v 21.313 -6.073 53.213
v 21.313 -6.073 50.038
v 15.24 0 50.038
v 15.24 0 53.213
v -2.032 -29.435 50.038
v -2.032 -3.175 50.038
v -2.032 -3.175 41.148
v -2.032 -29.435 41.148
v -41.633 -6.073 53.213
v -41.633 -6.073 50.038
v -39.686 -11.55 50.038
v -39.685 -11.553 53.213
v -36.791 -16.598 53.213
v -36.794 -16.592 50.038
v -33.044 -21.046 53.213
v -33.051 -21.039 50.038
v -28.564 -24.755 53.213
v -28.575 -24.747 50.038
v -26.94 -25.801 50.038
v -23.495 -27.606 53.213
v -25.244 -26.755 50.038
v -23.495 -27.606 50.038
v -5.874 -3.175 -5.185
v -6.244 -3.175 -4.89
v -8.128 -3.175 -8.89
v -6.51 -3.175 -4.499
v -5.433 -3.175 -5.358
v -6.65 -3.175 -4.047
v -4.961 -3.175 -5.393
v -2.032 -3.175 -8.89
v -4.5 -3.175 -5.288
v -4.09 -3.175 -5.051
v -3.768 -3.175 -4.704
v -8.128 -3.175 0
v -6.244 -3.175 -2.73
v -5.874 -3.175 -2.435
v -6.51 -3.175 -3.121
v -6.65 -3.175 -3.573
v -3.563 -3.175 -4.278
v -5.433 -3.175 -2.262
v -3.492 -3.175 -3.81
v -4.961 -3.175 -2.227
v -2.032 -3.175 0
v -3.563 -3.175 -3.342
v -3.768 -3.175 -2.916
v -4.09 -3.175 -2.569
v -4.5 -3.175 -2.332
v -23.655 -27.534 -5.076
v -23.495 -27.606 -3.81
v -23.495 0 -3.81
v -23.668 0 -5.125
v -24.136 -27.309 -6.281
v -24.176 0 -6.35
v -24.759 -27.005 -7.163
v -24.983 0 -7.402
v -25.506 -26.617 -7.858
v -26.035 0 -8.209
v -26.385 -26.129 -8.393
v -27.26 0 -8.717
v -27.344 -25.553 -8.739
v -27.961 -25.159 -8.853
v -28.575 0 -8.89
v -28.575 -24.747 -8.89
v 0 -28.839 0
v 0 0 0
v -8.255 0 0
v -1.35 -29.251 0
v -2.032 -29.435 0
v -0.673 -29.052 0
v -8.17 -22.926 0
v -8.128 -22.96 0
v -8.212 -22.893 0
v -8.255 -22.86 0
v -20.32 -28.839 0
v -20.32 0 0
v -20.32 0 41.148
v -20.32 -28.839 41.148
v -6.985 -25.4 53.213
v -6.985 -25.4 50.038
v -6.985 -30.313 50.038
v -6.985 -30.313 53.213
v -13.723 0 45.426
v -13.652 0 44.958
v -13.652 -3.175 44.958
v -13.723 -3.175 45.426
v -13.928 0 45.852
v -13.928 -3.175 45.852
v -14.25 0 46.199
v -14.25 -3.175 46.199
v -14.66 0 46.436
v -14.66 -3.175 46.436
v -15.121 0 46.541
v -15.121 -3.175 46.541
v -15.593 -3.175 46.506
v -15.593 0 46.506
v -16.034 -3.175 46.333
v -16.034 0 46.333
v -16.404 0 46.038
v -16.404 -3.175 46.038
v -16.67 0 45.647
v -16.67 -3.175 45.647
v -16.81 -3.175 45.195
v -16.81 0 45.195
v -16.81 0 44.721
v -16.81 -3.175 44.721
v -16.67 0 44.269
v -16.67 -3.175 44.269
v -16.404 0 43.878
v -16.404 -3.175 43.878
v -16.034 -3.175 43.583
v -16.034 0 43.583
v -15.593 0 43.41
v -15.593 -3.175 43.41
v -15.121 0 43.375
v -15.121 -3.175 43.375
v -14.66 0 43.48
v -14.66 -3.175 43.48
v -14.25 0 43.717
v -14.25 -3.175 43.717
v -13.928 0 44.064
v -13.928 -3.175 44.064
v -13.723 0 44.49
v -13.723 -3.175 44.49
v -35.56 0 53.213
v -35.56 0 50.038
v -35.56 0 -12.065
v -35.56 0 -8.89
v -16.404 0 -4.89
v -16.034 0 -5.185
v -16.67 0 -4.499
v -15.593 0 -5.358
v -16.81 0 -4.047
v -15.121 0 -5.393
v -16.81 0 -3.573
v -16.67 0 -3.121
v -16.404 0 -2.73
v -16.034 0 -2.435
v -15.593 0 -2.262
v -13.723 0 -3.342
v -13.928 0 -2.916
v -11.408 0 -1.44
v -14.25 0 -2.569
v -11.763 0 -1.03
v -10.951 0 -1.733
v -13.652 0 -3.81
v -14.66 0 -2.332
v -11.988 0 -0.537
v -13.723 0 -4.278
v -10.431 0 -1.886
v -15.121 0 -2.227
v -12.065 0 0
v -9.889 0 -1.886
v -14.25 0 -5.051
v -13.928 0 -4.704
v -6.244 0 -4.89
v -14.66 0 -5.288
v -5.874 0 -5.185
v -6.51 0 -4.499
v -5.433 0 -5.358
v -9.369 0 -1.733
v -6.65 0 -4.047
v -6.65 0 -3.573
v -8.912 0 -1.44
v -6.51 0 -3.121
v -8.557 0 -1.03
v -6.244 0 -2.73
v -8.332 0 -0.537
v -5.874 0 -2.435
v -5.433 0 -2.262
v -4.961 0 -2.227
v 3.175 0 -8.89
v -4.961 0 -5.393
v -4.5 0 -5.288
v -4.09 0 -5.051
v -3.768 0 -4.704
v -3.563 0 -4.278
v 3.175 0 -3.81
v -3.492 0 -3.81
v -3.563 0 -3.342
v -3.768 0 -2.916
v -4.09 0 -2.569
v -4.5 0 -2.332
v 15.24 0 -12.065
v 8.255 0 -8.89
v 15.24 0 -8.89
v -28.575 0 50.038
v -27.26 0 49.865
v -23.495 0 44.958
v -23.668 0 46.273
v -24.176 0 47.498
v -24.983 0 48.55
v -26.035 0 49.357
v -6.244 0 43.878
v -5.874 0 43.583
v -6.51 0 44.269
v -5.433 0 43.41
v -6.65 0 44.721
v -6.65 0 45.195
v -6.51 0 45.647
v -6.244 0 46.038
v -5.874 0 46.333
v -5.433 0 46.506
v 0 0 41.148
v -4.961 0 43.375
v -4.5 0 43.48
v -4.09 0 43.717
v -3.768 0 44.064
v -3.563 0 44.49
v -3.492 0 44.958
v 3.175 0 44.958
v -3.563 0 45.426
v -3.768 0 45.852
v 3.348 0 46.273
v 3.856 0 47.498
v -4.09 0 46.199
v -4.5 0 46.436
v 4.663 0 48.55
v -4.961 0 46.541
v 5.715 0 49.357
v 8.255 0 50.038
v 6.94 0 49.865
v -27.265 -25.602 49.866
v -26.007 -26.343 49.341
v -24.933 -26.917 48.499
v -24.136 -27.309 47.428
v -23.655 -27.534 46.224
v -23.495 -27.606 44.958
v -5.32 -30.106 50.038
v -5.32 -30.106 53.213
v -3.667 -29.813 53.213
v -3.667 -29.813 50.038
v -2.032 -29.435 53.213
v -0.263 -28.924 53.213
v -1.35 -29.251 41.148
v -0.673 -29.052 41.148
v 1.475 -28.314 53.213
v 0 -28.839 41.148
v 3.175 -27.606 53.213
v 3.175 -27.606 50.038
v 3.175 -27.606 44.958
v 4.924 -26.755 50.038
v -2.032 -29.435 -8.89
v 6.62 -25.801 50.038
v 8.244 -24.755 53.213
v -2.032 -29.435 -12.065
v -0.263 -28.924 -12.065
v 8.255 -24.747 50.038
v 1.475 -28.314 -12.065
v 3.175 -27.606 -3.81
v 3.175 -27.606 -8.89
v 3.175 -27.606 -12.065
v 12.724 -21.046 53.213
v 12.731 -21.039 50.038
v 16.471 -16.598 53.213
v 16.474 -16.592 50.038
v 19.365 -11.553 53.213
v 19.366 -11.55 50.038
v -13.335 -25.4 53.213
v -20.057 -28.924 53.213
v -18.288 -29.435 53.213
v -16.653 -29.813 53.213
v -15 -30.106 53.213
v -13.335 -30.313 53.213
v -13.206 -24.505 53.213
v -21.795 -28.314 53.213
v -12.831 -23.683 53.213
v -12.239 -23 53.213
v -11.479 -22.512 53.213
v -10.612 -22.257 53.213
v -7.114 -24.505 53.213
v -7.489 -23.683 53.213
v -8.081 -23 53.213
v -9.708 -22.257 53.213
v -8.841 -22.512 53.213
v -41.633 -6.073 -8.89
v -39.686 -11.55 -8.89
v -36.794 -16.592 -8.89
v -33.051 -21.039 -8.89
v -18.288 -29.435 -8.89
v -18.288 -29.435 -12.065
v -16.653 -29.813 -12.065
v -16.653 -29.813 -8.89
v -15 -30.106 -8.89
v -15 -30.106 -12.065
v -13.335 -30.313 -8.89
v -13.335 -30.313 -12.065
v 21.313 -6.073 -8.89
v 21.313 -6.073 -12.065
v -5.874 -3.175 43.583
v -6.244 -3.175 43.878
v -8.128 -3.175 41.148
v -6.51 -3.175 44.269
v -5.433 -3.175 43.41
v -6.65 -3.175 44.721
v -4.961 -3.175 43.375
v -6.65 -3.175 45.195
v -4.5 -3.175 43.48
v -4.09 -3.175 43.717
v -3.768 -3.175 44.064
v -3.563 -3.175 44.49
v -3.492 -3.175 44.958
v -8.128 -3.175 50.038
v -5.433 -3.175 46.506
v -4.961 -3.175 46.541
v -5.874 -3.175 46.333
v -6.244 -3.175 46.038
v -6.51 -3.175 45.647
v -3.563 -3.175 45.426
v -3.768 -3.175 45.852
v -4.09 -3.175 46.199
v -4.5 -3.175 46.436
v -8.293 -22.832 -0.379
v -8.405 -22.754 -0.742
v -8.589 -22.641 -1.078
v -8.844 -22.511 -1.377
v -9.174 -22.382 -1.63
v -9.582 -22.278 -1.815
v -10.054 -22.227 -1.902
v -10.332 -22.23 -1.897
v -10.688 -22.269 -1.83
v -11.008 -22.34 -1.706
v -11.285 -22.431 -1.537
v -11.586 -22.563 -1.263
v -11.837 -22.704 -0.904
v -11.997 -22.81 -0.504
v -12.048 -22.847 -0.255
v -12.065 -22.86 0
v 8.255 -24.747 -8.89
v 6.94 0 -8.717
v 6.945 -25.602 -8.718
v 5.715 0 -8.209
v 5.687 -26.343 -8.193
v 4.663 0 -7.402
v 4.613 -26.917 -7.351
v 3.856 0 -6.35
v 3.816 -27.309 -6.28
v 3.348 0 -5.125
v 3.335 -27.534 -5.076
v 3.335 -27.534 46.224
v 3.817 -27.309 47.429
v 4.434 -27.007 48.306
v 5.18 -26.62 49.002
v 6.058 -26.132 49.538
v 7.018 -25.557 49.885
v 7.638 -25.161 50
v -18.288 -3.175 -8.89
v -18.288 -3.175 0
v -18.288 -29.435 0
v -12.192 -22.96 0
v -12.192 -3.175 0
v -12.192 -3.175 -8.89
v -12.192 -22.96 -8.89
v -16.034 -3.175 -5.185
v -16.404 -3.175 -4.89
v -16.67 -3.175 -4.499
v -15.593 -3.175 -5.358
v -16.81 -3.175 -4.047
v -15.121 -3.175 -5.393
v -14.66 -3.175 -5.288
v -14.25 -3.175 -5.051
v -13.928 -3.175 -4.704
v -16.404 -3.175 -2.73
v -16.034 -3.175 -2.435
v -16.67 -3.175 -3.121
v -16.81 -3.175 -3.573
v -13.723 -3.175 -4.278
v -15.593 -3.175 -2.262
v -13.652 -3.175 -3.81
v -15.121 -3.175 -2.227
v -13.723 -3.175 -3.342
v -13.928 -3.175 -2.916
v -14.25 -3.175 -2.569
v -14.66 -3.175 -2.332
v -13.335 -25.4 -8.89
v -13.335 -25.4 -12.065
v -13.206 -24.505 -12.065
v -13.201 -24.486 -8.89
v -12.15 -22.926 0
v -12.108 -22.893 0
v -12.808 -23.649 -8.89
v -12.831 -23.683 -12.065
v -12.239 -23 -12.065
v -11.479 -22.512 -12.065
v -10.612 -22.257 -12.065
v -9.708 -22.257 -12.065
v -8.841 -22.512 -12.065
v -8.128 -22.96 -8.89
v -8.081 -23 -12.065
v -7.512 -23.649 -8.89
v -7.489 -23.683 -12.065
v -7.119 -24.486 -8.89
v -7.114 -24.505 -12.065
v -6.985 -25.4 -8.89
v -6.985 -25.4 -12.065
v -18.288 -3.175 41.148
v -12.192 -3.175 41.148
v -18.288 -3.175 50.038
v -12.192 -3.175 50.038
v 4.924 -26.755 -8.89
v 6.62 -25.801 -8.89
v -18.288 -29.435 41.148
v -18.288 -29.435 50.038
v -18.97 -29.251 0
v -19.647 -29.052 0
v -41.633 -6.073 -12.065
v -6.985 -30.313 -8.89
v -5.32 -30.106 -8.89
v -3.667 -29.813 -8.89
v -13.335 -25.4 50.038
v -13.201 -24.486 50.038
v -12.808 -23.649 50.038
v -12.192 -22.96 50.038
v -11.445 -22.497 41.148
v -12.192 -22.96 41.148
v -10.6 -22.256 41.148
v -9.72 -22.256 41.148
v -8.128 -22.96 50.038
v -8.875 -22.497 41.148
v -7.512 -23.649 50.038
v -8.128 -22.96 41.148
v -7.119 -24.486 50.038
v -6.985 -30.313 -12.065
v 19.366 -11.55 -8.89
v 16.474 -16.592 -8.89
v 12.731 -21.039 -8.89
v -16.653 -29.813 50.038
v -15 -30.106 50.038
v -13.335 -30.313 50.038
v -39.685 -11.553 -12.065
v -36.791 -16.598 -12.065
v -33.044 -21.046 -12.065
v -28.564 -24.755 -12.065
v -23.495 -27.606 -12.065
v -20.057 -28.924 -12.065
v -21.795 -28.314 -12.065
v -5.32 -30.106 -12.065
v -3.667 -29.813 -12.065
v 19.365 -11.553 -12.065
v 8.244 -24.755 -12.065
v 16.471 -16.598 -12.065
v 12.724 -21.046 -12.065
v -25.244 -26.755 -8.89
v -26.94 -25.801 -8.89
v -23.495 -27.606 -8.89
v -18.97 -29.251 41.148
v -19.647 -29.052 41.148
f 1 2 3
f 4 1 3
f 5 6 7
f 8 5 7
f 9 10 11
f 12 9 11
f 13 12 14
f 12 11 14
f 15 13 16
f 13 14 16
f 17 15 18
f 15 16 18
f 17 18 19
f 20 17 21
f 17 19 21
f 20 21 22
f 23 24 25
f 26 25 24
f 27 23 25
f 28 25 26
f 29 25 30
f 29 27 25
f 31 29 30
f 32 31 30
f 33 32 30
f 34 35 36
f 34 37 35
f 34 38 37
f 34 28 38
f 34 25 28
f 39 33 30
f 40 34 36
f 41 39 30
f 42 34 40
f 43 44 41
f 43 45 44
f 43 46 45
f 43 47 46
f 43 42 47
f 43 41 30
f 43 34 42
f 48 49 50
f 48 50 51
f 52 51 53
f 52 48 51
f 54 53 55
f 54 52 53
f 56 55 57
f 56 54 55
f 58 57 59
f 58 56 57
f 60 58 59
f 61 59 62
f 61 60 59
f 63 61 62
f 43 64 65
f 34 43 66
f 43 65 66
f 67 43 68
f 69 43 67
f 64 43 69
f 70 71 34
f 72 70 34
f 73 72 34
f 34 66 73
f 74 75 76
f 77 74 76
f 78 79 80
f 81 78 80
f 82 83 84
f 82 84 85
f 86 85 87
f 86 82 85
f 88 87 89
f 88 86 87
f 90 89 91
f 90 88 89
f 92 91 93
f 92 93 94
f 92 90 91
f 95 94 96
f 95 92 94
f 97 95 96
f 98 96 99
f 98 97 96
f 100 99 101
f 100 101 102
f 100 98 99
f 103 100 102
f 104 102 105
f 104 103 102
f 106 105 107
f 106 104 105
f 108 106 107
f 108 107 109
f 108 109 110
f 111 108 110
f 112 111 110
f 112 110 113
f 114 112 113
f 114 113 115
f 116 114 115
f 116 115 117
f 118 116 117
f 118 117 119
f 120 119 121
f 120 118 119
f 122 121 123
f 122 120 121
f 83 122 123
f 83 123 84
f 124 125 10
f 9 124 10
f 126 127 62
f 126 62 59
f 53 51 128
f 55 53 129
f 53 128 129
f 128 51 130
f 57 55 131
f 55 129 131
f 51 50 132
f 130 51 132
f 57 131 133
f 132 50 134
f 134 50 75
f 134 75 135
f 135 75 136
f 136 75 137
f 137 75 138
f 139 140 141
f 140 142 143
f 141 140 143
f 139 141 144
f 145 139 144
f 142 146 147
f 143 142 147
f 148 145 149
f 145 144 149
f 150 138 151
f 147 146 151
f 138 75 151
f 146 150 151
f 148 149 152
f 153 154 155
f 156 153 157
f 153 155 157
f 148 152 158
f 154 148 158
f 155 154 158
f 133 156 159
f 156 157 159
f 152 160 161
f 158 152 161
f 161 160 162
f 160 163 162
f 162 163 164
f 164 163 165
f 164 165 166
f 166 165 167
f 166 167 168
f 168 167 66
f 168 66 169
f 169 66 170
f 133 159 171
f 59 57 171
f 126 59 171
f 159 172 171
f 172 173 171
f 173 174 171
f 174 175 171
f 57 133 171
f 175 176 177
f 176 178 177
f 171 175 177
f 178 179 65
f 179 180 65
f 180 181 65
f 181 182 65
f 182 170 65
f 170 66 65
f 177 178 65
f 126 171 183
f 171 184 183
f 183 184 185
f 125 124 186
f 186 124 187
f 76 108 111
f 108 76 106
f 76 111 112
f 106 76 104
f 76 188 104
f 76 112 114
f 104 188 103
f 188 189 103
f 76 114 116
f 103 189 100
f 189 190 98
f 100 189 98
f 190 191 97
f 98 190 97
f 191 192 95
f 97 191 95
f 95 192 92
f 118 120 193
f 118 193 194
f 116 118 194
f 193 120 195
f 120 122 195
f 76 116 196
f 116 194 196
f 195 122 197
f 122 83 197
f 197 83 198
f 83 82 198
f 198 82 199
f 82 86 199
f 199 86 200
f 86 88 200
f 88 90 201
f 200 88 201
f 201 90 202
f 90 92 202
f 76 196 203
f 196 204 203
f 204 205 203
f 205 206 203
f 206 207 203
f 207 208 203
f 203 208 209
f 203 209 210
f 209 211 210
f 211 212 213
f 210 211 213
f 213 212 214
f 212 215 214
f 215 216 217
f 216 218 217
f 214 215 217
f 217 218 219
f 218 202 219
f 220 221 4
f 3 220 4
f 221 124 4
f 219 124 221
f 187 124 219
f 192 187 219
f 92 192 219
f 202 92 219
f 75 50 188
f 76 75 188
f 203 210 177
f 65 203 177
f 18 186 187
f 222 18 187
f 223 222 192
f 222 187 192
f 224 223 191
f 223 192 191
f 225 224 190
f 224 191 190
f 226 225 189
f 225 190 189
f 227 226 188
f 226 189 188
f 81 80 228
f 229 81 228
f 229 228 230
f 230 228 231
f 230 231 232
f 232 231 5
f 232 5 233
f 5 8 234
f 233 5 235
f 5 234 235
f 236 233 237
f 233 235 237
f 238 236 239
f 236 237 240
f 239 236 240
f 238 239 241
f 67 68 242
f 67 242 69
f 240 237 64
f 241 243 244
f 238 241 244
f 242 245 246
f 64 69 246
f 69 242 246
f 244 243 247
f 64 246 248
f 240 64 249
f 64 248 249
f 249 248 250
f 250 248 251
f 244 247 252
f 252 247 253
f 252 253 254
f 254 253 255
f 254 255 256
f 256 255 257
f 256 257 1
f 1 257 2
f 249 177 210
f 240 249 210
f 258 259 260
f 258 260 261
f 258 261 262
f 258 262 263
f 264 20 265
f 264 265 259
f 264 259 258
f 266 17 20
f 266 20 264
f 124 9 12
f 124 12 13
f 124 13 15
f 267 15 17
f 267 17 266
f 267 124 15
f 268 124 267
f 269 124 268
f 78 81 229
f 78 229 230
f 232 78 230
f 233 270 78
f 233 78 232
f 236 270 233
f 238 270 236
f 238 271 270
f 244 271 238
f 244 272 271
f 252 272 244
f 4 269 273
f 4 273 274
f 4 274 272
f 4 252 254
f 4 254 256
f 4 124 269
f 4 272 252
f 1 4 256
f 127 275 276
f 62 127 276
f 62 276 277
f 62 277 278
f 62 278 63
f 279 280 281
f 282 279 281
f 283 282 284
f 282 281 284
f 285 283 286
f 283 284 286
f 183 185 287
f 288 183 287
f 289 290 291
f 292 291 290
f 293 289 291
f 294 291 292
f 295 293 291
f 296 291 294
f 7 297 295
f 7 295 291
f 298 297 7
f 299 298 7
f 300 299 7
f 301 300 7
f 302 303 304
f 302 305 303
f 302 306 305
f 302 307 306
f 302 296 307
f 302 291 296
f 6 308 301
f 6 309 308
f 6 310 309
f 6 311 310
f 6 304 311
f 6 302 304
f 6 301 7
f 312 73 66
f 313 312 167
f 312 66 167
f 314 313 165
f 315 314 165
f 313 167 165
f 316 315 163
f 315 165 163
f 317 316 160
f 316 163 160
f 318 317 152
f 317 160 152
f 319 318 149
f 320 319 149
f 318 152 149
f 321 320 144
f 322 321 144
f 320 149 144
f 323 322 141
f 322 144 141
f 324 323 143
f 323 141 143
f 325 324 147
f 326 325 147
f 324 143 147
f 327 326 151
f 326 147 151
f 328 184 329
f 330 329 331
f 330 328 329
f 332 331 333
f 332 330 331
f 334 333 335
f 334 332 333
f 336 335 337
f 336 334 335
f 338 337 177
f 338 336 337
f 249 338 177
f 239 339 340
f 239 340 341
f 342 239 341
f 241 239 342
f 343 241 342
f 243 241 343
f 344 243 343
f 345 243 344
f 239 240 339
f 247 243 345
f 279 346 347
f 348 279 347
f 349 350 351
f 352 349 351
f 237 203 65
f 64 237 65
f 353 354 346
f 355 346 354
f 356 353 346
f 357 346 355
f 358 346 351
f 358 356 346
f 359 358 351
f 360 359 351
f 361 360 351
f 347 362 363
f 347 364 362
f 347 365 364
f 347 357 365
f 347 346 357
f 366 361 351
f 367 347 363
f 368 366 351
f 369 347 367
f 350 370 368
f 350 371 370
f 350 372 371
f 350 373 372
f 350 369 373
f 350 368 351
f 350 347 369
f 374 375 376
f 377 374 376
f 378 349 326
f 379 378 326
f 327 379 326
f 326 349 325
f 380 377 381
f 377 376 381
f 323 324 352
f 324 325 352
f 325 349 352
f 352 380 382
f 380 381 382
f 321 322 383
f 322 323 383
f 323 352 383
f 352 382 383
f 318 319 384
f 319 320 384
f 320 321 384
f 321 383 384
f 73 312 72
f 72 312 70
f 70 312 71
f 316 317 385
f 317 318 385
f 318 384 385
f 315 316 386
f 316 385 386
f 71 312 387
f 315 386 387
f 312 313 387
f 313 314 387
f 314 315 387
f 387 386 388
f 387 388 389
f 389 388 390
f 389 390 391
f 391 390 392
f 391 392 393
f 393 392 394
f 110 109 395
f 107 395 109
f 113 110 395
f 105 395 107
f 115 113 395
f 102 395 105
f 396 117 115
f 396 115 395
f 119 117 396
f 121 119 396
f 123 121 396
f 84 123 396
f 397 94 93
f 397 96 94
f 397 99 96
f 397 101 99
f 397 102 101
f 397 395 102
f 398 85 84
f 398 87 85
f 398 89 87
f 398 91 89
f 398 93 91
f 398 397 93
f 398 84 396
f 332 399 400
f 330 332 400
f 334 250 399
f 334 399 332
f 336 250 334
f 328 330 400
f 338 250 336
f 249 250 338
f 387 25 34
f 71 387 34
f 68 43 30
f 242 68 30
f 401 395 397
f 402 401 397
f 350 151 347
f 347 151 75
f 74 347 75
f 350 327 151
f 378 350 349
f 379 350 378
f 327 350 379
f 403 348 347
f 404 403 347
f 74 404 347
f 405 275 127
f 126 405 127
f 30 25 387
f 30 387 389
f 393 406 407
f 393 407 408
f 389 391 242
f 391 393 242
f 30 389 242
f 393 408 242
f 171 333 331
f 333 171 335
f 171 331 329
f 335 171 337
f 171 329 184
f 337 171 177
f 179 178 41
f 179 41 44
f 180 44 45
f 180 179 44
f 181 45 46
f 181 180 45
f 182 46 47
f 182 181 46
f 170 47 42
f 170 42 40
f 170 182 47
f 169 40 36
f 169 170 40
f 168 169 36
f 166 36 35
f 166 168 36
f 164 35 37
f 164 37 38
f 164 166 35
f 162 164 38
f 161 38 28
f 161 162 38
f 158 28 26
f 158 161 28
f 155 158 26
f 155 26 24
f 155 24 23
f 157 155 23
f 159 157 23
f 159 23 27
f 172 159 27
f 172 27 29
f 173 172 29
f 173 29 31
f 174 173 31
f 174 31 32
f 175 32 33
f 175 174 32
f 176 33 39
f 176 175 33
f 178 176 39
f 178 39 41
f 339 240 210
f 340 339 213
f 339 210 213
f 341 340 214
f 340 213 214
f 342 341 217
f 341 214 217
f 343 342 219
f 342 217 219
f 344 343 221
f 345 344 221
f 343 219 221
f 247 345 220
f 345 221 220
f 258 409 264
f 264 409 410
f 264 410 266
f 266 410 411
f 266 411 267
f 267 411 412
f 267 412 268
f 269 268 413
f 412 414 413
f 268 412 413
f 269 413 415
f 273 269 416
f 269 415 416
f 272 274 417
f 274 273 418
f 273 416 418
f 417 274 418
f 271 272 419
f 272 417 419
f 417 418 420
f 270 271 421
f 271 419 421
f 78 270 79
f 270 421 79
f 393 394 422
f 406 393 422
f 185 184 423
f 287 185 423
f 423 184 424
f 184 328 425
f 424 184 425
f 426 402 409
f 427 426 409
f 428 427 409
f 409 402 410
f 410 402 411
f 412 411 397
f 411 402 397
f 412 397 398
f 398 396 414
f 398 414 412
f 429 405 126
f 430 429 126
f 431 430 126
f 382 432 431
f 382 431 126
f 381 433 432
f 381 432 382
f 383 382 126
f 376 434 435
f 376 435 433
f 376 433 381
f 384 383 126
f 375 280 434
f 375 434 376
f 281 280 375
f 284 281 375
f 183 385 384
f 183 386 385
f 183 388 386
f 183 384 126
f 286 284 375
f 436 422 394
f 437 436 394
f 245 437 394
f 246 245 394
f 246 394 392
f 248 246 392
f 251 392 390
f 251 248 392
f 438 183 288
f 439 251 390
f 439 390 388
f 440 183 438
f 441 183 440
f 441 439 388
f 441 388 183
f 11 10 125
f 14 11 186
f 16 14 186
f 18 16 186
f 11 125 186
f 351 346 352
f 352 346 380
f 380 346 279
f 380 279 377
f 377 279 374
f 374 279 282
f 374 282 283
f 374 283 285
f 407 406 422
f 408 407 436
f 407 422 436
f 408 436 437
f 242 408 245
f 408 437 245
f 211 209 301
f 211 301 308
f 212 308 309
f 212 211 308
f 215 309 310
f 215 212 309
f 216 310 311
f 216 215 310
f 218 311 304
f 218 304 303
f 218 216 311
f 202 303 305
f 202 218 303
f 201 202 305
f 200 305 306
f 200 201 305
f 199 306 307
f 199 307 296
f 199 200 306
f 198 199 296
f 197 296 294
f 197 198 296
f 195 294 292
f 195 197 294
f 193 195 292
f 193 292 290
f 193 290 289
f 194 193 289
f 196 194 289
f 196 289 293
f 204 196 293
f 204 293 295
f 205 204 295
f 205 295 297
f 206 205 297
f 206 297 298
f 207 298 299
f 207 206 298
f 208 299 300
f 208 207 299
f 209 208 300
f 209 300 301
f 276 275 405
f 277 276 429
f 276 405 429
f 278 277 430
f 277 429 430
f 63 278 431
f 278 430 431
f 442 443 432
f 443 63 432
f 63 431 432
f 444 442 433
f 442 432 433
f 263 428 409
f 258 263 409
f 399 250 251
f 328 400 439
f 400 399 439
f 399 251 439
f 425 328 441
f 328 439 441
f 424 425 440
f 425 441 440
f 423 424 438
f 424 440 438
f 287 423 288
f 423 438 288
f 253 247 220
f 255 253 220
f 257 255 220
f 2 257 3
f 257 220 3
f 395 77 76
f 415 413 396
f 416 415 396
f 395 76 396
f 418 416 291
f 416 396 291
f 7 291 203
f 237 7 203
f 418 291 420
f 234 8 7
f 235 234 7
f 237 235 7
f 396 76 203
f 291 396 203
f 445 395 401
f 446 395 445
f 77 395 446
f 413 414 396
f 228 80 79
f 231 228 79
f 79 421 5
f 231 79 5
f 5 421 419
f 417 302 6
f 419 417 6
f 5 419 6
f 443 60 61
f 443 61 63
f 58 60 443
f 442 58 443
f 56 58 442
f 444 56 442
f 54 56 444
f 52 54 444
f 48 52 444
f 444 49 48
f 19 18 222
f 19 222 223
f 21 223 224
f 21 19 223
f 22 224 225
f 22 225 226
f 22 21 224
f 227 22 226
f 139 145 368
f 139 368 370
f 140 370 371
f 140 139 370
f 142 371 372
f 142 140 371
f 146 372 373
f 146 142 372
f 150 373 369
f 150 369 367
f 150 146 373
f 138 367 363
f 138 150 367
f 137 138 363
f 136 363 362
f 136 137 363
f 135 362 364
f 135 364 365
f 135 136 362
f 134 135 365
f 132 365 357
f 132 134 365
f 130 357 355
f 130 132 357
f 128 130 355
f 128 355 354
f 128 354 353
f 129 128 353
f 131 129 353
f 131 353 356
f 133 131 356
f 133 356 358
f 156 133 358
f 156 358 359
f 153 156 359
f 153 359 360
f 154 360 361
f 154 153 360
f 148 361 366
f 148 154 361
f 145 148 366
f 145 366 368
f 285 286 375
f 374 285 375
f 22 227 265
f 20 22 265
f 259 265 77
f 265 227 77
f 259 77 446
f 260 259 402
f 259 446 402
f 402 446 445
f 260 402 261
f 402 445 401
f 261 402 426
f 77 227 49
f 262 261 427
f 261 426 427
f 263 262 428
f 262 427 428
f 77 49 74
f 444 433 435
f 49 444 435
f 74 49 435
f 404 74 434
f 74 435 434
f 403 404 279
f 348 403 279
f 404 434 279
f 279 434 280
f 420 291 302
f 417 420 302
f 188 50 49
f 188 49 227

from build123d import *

# Parameters (mm, degrees)
F0_W          = 26.67
F0_H          = 58.928
F0_R          = 1.5875
F1_DEPTH      = 3.175
F2_W          = 4.064
F2_H          = 8.89
F3_DEPTH      = 38.1
F5_DEPTH      = 101.6
F7_DEPTH      = 3.175
F9_DEPTH      = 3.175
F11_DEPTH     = 127
F12_T4_DEPTH  = 40.3062822545
F12_S5_R      = 32.5
F12_T6_DEPTH  = 22
F12_T10_DEPTH = 40.3062822545
F12_S11_R     = 32.5
F12_T12_DEPTH = 22
F12_T16_DEPTH = 40.3062822545
F12_S17_R     = 32.5
F12_T18_DEPTH = 22
F12_T22_DEPTH = 40.3062822545
F12_S23_R     = 32.5
F12_T24_DEPTH = 22


# Not quite as in the source:
# - a fillet or chamfer that OpenCascade refuses, or shapes differently, is made with other operations: its cross-section is extruded or revolved along the edge and cut away or added
# - after a boolean that leaves OpenCascade's solid faulty, fix() repairs it


with BuildPart() as f1:
    # F0 (on Front) → F1 (new body)
    with BuildSketch(Plane.XZ):
        with Locations((-10.16, 20.574)):
            Rectangle(F0_W, F0_H)
        with Locations((-15.24, -3.81)):
            Circle(F0_R, mode=Mode.SUBTRACT)
        with BuildLine():
            Line((0, 41.148), (0, 0))
            Line((0, 0), (-8.255, 0))
            ThreePointArc((-8.255, 0), (-10.16, -1.905), (-12.065, 0))
            Line((-12.065, 0), (-20.32, 0))
            Line((-20.32, 0), (-20.32, 41.148))
            Line((-20.32, 41.148), (0, 41.148))
        make_face(mode=Mode.SUBTRACT)
        with Locations((-5.08, -3.81)):
            Circle(F0_R, mode=Mode.SUBTRACT)
        with Locations((-15.24, 44.958)):
            Circle(F0_R, mode=Mode.SUBTRACT)
        with Locations((-5.08, 44.958)):
            Circle(F0_R, mode=Mode.SUBTRACT)
    extrude(amount=F1_DEPTH)

    # F2 (on face) → F3 (join)
    with BuildSketch(Plane.XZ.offset(3.175)):
        Polygon((0, 0), (-2.032, 0), (-2.032, -8.89), (3.175, -8.89), (3.175, 50.038), (-2.032, 50.038), (-2.032, 41.148), (0, 41.148), align=None)
        with BuildLine():
            Line((-8.128, -8.89), (-8.128, 0))
            Line((-8.128, 0), (-8.255, 0))
            ThreePointArc((-8.255, 0), (-10.16, -1.905), (-12.065, 0))
            Line((-12.065, 0), (-12.192, 0))
            Line((-12.192, 0), (-12.192, -8.89))
            Line((-12.192, -8.89), (-8.128, -8.89))
        make_face()
        Polygon((-23.495, -8.89), (-18.288, -8.89), (-18.288, 0), (-20.32, 0), (-20.32, 41.148), (-18.288, 41.148), (-18.288, 50.038), (-23.495, 50.038), align=None)
        with Locations((-10.16, 45.593)):
            Rectangle(F2_W, F2_H)
    extrude(amount=F3_DEPTH)

    # F4 (on face) → F5 (intersect)
    with BuildSketch(Plane.XY.offset(50.038)):
        with BuildLine():
            Line((-23.495, 0), (-23.495, -27.6062822545))
            ThreePointArc((-23.495, -27.6062822545), (-20.9303918657, -28.6314743475), (-18.288, -29.4352149387))
            Line((-18.288, -29.4352149387), (-18.288, -3.175))
            Line((-18.288, -3.175), (-12.192, -3.175))
            Line((-12.192, -3.175), (-12.192, -30.4044143518))
            ThreePointArc((-12.192, -30.4044143518), (-10.16, -30.468), (-8.128, -30.4044143518))
            Line((-8.128, -30.4044143518), (-8.128, -3.175))
            Line((-8.128, -3.175), (-2.032, -3.175))
            Line((-2.032, -3.175), (-2.032, -29.4352149387))
            ThreePointArc((-2.032, -29.4352149387), (0.6103918657, -28.6314743475), (3.175, -27.6062822545))
            Line((3.175, -27.6062822545), (3.175, 0))
            Line((3.175, 0), (-10.16, 0))
            Line((-10.16, 0), (-23.495, 0))
        make_face()
    extrude(amount=-F5_DEPTH, mode=Mode.INTERSECT)

    # F6 (on face) → F7 (join)
    with BuildSketch(Plane(origin=(0, 0, -8.89), x_dir=(1, 0, 0), z_dir=(0, 0, -1))):
        with BuildLine():
            Line((15.24, 0), (21.313116807, 6.073116807))
            ThreePointArc((21.313116807, 6.073116807), (14.6968126777, 18.9057377838), (3.175, 27.6062822545))
            Line((3.175, 27.6062822545), (3.175, 0))
            Line((3.175, 0), (15.24, 0))
        make_face()
        with BuildLine():
            Line((3.175, 0), (3.175, 27.6062822545))
            ThreePointArc((3.175, 27.6062822545), (0.6103918657, 28.6314743475), (-2.032, 29.4352149387))
            Line((-2.032, 29.4352149387), (-2.032, 3.175))
            Line((-2.032, 3.175), (-8.128, 3.175))
            Line((-8.128, 3.175), (-8.128, 30.4044143518))
            ThreePointArc((-8.128, 30.4044143518), (-10.16, 30.468), (-12.192, 30.4044143518))
            Line((-12.192, 30.4044143518), (-12.192, 3.175))
            Line((-12.192, 3.175), (-18.288, 3.175))
            Line((-18.288, 3.175), (-18.288, 29.4352149387))
            ThreePointArc((-18.288, 29.4352149387), (-20.9303918657, 28.6314743475), (-23.495, 27.6062822545))
            Line((-23.495, 27.6062822545), (-23.495, 0))
            Line((-23.495, 0), (-10.16, 0))
            Line((-10.16, 0), (3.175, 0))
        make_face()
        with BuildLine():
            Line((-2.032, 3.175), (-2.032, 29.4352149387))
            ThreePointArc((-2.032, 29.4352149387), (-5.0569384801, 30.0648653162), (-8.128, 30.4044143518))
            Line((-8.128, 30.4044143518), (-8.128, 3.175))
            Line((-8.128, 3.175), (-2.032, 3.175))
        make_face()
        with BuildLine():
            Line((-12.192, 3.175), (-12.192, 30.4044143518))
            ThreePointArc((-12.192, 30.4044143518), (-15.2630615199, 30.0648653162), (-18.288, 29.4352149387))
            Line((-18.288, 29.4352149387), (-18.288, 3.175))
            Line((-18.288, 3.175), (-12.192, 3.175))
        make_face()
        with BuildLine():
            Line((-35.56, 0), (-23.495, 0))
            Line((-23.495, 0), (-23.495, 27.6062822545))
            ThreePointArc((-23.495, 27.6062822545), (-35.0168126777, 18.9057377838), (-41.633116807, 6.073116807))
            Line((-41.633116807, 6.073116807), (-35.56, 0))
        make_face()
    extrude(amount=F7_DEPTH)

    add(f1.part.fix(), mode=Mode.REPLACE)

    # F8 (on face) → F9 (join)
    with BuildSketch(Plane.XY.offset(50.038)):
        with BuildLine():
            Line((-23.495, -27.6062822545), (-23.495, 0))
            Line((-23.495, 0), (-35.56, 0))
            Line((-35.56, 0), (-41.633116807, -6.073116807))
            ThreePointArc((-41.633116807, -6.073116807), (-35.0168126777, -18.9057377838), (-23.495, -27.6062822545))
        make_face()
        with BuildLine():
            Line((15.24, 0), (3.175, 0))
            Line((3.175, 0), (3.175, -27.6062822545))
            ThreePointArc((3.175, -27.6062822545), (14.6968126777, -18.9057377838), (21.313116807, -6.073116807))
            Line((21.313116807, -6.073116807), (15.24, 0))
        make_face()
        with BuildLine():
            Line((-18.288, -3.175), (-18.288, -29.4352149387))
            ThreePointArc((-18.288, -29.4352149387), (-15.2630615199, -30.0648653162), (-12.192, -30.4044143518))
            Line((-12.192, -30.4044143518), (-12.192, -3.175))
            Line((-12.192, -3.175), (-18.288, -3.175))
        make_face()
        with BuildLine():
            ThreePointArc((-8.128, -30.4044143518), (-5.0569384801, -30.0648653162), (-2.032, -29.4352149387))
            Line((-2.032, -29.4352149387), (-2.032, -3.175))
            Line((-2.032, -3.175), (-8.128, -3.175))
            Line((-8.128, -3.175), (-8.128, -30.4044143518))
        make_face()
        with BuildLine():
            Line((3.175, -27.6062822545), (3.175, 0))
            Line((3.175, 0), (-23.495, 0))
            Line((-23.495, 0), (-23.495, -27.6062822545))
            ThreePointArc((-23.495, -27.6062822545), (-20.9303918657, -28.6314743475), (-18.288, -29.4352149387))
            Line((-18.288, -29.4352149387), (-18.288, -3.175))
            Line((-18.288, -3.175), (-12.192, -3.175))
            Line((-12.192, -3.175), (-12.192, -30.4044143518))
            ThreePointArc((-12.192, -30.4044143518), (-10.16, -30.468), (-8.128, -30.4044143518))
            Line((-8.128, -30.4044143518), (-8.128, -3.175))
            Line((-8.128, -3.175), (-2.032, -3.175))
            Line((-2.032, -3.175), (-2.032, -29.4352149387))
            ThreePointArc((-2.032, -29.4352149387), (0.6103918657, -28.6314743475), (3.175, -27.6062822545))
        make_face()
    extrude(amount=F9_DEPTH)

    # F10 (on face) → F11 (cut)
    with BuildSketch(Plane(origin=(0, 0, -12.065), x_dir=(1, 0, 0), z_dir=(0, 0, -1))):
        with BuildLine():
            Line((-13.335, 30.312541657), (-13.335, 25.4))
            ThreePointArc((-13.335, 25.4), (-10.16, 22.225), (-6.985, 25.4))
            Line((-6.985, 25.4), (-6.985, 30.312541657))
            ThreePointArc((-6.985, 30.312541657), (-10.16, 30.468), (-13.335, 30.312541657))
        make_face()
    extrude(amount=-F11_DEPTH, mode=Mode.SUBTRACT)

    # F12: fillet of radius 5.08 on 4 edges, made by hand


with BuildPart() as f12_tool2:
    # F12_s3 → F12_t4 (new body)
    with BuildSketch(Plane.XZ.offset(40.3062822545)):
        with BuildLine():
            ThreePointArc((-23.495, -3.81), (-24.9828975516, -7.4021024484), (-28.575, -8.89))
            Line((-28.575, -8.89), (-23.495, -8.89))
            Line((-23.495, -8.89), (-23.495, -3.81))
        make_face()
    extrude(amount=-F12_T4_DEPTH)

    # F12_s5 → F12_t6 (intersect, symmetric)
    with BuildSketch(Plane.XY.offset(-6.4)):
        with Locations((-10.16, 2.032)):
            Circle(F12_S5_R)
    extrude(amount=F12_T6_DEPTH, both=True, mode=Mode.INTERSECT)


with BuildPart() as f1_1:
    add(f1.part)

    # F12_t1: union F12_tool2
    add(f12_tool2.part)


with BuildPart() as f12_tool8:
    # F12_s9 → F12_t10 (new body)
    with BuildSketch(Plane.XZ):
        with BuildLine():
            ThreePointArc((-28.575, 50.038), (-24.9828975516, 48.5501024484), (-23.495, 44.958))
            Line((-23.495, 44.958), (-23.495, 50.038))
            Line((-23.495, 50.038), (-28.575, 50.038))
        make_face()
    extrude(amount=F12_T10_DEPTH)

    # F12_s11 → F12_t12 (intersect, symmetric)
    with BuildSketch(Plane.XY.offset(47.5)):
        with Locations((-10.16, 2.032)):
            Circle(F12_S11_R)
    extrude(amount=F12_T12_DEPTH, both=True, mode=Mode.INTERSECT)


with BuildPart() as f1_2:
    add(f1_1.part)

    # F12_t7: union F12_tool8
    add(f12_tool8.part)


with BuildPart() as f12_tool14:
    # F12_s15 → F12_t16 (new body)
    with BuildSketch(Plane.XZ):
        with BuildLine():
            ThreePointArc((3.175, 44.958), (4.6628975516, 48.5501024484), (8.255, 50.038))
            Line((8.255, 50.038), (3.175, 50.038))
            Line((3.175, 50.038), (3.175, 44.958))
        make_face()
    extrude(amount=F12_T16_DEPTH)

    # F12_s17 → F12_t18 (intersect, symmetric)
    with BuildSketch(Plane.XY.offset(47.5)):
        with Locations((-10.16, 2.032)):
            Circle(F12_S17_R)
    extrude(amount=F12_T18_DEPTH, both=True, mode=Mode.INTERSECT)


with BuildPart() as f1_3:
    add(f1_2.part)

    # F12_t13: union F12_tool14
    add(f12_tool14.part)


with BuildPart() as f12_tool20:
    # F12_s21 → F12_t22 (new body)
    with BuildSketch(Plane.XZ.offset(40.3062822545)):
        with BuildLine():
            ThreePointArc((8.255, -8.89), (4.6628975516, -7.4021024484), (3.175, -3.81))
            Line((3.175, -3.81), (3.175, -8.89))
            Line((3.175, -8.89), (8.255, -8.89))
        make_face()
    extrude(amount=-F12_T22_DEPTH)

    # F12_s23 → F12_t24 (intersect, symmetric)
    with BuildSketch(Plane.XY.offset(-6.4)):
        with Locations((-10.16, 2.032)):
            Circle(F12_S23_R)
    extrude(amount=F12_T24_DEPTH, both=True, mode=Mode.INTERSECT)


with BuildPart() as f1_4:
    add(f1_3.part)

    # F12_t19: union F12_tool20
    add(f12_tool20.part)


solid = f1_4.part
